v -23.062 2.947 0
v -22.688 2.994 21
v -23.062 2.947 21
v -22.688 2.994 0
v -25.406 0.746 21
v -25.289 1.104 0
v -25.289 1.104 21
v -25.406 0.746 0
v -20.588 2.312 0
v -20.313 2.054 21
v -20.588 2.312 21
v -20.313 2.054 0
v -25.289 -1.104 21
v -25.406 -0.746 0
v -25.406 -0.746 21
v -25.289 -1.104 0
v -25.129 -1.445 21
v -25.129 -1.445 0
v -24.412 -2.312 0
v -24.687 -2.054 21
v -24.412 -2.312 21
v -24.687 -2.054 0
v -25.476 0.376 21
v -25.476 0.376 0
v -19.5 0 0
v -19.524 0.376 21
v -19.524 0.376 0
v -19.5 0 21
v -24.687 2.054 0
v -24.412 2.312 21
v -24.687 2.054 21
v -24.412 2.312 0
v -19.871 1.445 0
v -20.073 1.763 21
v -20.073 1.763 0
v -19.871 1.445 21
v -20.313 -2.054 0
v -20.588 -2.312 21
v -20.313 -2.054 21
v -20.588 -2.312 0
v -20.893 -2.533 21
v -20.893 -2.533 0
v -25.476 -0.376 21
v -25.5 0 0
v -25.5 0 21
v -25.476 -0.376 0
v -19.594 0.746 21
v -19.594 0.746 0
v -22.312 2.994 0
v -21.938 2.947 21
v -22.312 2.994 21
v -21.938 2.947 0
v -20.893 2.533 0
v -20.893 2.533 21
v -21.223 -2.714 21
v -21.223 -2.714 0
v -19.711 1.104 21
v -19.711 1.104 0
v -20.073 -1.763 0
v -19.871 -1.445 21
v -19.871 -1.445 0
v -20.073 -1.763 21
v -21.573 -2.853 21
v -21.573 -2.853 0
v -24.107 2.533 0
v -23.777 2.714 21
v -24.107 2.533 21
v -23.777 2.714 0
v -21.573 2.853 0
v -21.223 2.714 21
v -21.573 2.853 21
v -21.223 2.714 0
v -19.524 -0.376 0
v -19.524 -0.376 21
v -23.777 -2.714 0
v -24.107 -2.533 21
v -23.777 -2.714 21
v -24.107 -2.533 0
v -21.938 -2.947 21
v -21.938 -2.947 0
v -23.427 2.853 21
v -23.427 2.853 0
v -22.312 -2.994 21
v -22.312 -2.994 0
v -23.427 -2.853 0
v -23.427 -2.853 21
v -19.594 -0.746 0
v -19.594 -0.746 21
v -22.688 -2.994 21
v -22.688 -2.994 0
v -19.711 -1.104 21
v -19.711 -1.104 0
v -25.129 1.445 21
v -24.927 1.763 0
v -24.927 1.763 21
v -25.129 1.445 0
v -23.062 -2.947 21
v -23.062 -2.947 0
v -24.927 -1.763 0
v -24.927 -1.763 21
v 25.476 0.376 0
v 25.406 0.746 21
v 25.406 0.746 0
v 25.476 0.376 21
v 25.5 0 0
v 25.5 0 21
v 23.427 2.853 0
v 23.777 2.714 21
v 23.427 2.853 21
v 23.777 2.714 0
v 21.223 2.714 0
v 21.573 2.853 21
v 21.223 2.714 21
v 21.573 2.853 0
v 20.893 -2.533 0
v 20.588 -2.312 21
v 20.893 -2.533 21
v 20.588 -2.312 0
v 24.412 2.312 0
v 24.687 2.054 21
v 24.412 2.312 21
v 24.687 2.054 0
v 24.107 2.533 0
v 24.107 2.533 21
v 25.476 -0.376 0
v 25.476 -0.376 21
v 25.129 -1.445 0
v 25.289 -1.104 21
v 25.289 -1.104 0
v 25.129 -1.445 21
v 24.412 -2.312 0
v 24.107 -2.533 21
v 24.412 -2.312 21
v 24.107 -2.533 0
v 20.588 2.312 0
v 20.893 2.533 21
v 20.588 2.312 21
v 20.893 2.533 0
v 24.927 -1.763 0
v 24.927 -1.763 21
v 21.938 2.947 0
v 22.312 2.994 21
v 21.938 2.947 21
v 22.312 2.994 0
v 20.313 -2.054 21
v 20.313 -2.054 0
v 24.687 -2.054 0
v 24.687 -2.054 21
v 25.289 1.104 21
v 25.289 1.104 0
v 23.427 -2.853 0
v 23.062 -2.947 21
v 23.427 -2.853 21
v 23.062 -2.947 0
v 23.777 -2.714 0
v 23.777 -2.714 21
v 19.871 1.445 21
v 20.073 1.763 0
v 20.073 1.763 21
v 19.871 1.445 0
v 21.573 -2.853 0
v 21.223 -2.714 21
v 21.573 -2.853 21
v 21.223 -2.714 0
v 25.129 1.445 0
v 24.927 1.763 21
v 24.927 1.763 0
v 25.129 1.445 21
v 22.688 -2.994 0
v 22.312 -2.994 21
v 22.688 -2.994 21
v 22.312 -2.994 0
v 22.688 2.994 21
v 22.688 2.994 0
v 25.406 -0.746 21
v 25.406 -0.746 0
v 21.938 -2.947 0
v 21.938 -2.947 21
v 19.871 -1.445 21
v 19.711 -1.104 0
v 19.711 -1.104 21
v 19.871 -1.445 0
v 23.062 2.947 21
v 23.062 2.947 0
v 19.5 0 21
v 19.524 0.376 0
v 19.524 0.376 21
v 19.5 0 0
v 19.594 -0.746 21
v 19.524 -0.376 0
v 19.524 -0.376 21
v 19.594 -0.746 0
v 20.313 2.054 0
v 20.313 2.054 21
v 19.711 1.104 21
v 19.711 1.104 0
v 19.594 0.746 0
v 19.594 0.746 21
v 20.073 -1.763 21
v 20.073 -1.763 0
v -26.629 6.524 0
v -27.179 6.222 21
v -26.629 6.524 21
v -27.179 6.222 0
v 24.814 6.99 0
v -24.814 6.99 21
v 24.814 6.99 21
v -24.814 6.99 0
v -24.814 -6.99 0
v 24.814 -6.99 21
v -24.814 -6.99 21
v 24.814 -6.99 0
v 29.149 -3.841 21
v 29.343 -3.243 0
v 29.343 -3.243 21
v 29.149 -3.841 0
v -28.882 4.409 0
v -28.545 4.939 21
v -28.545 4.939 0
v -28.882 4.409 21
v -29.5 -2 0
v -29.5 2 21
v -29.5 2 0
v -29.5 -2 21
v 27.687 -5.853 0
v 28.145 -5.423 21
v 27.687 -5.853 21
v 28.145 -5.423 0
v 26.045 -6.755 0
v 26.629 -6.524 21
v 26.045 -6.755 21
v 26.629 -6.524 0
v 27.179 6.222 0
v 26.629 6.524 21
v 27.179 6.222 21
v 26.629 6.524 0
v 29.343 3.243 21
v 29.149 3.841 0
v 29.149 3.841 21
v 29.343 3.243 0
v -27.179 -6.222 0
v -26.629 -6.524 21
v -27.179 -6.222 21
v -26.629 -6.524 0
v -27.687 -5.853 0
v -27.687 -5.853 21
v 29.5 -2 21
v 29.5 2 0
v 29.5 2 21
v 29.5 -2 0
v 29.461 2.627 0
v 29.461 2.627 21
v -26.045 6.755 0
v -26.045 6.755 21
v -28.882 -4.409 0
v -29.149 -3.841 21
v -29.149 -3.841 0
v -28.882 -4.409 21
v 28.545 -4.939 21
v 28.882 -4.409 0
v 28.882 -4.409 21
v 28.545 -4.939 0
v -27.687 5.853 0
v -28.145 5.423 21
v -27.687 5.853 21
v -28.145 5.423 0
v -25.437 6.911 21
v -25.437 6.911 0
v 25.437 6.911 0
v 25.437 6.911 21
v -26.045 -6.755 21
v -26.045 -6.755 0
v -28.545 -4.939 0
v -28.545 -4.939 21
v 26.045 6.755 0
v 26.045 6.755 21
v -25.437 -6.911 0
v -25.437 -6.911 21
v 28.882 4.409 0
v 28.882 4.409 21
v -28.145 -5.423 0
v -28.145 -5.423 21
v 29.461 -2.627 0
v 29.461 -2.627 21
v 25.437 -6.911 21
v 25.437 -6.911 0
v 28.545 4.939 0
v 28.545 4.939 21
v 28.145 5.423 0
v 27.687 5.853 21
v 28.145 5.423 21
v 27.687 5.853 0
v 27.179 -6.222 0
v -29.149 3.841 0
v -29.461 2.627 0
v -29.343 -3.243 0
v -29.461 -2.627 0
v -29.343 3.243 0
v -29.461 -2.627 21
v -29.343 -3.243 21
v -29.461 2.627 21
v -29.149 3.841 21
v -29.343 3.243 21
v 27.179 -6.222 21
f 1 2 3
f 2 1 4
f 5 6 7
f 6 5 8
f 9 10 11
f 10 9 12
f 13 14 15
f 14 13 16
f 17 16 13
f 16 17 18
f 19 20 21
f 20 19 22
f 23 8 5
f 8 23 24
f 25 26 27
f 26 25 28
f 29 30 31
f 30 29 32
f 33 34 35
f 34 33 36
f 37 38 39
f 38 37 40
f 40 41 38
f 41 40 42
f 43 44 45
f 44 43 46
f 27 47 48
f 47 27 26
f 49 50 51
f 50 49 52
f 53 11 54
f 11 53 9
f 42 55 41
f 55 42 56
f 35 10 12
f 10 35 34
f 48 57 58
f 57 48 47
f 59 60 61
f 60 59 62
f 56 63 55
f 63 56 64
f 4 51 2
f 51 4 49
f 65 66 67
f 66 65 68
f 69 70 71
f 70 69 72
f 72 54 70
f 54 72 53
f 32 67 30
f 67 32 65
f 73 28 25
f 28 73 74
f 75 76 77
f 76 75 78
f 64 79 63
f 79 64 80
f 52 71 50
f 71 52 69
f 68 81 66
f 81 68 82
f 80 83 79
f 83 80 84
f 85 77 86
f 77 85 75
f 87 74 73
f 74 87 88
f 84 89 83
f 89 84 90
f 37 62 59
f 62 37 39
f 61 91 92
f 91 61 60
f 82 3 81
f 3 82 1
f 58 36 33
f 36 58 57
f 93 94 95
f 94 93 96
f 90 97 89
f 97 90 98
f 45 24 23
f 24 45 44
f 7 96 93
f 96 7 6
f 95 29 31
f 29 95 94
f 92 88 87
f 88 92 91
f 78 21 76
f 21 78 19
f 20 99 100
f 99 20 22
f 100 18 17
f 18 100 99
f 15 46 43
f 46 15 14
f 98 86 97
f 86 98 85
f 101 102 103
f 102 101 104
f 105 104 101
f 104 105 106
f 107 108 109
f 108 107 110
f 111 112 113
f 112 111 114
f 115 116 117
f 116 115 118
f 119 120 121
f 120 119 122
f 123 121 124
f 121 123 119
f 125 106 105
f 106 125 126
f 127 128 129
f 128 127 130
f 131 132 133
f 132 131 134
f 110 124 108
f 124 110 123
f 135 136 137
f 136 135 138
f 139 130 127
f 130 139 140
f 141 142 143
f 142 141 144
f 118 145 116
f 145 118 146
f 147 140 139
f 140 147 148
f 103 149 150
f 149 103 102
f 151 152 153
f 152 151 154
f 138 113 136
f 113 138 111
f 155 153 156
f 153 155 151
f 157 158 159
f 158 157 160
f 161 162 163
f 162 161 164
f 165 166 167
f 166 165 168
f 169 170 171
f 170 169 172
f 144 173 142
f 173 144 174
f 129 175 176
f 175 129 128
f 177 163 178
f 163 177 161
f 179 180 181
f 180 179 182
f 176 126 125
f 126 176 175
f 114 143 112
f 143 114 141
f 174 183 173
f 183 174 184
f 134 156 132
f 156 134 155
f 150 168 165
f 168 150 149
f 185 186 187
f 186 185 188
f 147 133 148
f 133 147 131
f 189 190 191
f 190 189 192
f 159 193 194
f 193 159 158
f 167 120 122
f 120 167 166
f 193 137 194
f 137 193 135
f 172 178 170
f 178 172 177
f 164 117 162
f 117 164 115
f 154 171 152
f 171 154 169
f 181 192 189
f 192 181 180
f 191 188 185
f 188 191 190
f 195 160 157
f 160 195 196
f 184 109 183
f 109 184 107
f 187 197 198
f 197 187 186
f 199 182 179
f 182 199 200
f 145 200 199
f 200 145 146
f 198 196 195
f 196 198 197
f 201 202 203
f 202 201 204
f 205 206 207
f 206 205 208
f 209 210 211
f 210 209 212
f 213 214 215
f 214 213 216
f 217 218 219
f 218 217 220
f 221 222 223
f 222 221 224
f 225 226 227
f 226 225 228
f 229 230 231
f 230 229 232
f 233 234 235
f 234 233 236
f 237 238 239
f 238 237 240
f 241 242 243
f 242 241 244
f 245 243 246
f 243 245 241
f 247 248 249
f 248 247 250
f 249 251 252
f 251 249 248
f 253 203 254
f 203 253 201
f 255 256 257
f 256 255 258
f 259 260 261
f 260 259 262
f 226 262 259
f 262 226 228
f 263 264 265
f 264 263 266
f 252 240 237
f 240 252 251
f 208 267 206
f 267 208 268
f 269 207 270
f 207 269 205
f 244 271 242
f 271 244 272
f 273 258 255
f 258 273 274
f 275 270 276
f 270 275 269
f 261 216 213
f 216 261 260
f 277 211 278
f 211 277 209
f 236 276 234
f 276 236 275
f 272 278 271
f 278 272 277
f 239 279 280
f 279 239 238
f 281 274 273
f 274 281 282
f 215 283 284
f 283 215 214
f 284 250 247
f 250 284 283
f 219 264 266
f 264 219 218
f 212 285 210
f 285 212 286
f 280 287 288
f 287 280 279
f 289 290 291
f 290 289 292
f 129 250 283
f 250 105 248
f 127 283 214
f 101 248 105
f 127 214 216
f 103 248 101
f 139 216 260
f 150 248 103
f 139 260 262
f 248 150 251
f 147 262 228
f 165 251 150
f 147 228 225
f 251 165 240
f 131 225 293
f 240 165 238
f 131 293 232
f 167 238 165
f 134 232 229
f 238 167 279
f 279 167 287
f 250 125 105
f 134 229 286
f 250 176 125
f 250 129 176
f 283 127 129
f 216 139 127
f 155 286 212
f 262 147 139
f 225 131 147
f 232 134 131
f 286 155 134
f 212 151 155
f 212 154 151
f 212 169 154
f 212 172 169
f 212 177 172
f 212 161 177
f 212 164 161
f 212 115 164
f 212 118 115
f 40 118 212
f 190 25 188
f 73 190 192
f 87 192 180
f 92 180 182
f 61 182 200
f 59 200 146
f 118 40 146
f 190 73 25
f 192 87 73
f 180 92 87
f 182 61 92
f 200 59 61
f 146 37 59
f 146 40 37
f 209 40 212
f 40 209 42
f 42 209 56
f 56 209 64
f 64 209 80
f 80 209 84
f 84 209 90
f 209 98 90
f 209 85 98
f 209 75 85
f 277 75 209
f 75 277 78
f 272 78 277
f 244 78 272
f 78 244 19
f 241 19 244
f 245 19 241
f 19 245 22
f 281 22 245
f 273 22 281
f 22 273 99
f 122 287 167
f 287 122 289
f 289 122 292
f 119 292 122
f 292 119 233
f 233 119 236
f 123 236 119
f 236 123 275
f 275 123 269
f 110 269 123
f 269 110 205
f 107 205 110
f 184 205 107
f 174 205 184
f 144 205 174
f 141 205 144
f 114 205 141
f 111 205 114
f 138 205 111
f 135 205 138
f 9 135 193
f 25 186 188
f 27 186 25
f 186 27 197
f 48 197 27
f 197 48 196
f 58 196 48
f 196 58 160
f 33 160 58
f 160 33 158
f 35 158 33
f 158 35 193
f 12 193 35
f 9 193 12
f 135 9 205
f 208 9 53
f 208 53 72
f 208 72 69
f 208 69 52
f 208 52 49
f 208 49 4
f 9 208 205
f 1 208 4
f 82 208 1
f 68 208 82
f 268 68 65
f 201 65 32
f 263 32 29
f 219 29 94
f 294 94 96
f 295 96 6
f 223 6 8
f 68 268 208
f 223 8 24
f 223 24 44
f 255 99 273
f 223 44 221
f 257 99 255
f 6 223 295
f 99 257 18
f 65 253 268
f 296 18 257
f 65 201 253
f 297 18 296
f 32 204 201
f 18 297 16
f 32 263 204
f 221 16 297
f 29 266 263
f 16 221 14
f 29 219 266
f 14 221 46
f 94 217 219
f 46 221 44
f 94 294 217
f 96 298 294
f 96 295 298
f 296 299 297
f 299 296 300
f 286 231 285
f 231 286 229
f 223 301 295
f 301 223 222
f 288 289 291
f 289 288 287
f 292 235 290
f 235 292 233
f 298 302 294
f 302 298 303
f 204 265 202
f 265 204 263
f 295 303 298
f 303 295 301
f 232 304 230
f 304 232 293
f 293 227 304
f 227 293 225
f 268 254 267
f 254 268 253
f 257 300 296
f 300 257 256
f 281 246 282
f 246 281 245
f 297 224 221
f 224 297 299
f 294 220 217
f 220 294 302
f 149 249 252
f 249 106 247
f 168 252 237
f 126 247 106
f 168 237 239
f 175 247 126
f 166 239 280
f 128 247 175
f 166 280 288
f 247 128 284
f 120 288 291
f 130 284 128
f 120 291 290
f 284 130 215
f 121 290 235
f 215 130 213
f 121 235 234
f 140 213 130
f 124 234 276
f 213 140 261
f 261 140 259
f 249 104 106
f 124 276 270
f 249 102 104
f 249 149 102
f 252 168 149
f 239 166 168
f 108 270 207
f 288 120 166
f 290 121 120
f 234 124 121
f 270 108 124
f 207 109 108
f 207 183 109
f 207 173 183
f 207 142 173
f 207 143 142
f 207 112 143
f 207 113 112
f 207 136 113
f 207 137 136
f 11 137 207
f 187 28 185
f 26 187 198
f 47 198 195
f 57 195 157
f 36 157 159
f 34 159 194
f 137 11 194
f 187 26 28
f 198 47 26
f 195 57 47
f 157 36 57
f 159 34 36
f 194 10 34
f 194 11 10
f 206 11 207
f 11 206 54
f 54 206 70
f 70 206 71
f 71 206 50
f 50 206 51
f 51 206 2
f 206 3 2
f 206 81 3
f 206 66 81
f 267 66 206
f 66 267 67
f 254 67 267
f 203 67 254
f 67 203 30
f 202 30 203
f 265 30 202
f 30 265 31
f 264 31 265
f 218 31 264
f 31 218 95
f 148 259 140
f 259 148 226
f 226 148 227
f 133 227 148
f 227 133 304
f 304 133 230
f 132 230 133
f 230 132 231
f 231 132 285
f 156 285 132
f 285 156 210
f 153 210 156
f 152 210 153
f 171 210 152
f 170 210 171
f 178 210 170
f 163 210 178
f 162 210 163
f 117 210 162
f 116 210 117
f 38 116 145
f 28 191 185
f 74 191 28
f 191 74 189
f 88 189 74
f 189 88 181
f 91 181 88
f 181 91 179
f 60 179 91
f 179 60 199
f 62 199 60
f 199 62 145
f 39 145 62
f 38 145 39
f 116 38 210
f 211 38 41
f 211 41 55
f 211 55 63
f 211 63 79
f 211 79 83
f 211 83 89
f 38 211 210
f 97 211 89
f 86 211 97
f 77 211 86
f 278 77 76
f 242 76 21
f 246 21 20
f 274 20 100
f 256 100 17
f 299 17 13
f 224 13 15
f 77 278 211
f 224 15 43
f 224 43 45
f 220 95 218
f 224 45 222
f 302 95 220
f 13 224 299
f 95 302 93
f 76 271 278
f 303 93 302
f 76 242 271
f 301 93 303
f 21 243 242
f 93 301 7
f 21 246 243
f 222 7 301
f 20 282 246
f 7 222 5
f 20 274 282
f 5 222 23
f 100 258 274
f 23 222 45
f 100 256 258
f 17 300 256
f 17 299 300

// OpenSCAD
$fn = 50;


difference() {
	union() {
		hull() {
			translate(v = [-24.5000000000, 2.0000000000, 0]) {
				cylinder(h = 21, r = 5);
			}
			translate(v = [24.5000000000, 2.0000000000, 0]) {
				cylinder(h = 21, r = 5);
			}
			translate(v = [-24.5000000000, -2.0000000000, 0]) {
				cylinder(h = 21, r = 5);
			}
			translate(v = [24.5000000000, -2.0000000000, 0]) {
				cylinder(h = 21, r = 5);
			}
		}
	}
	union() {
		translate(v = [-22.5000000000, 0.0000000000, -100.0000000000]) {
			cylinder(h = 200, r = 3.0000000000);
		}
		translate(v = [-22.5000000000, 0.0000000000, -100.0000000000]) {
			cylinder(h = 200, r = 3.0000000000);
		}
		translate(v = [22.5000000000, 0.0000000000, -100.0000000000]) {
			cylinder(h = 200, r = 3.0000000000);
		}
		translate(v = [22.5000000000, 0.0000000000, -100.0000000000]) {
			cylinder(h = 200, r = 3.0000000000);
		}
	}
}
